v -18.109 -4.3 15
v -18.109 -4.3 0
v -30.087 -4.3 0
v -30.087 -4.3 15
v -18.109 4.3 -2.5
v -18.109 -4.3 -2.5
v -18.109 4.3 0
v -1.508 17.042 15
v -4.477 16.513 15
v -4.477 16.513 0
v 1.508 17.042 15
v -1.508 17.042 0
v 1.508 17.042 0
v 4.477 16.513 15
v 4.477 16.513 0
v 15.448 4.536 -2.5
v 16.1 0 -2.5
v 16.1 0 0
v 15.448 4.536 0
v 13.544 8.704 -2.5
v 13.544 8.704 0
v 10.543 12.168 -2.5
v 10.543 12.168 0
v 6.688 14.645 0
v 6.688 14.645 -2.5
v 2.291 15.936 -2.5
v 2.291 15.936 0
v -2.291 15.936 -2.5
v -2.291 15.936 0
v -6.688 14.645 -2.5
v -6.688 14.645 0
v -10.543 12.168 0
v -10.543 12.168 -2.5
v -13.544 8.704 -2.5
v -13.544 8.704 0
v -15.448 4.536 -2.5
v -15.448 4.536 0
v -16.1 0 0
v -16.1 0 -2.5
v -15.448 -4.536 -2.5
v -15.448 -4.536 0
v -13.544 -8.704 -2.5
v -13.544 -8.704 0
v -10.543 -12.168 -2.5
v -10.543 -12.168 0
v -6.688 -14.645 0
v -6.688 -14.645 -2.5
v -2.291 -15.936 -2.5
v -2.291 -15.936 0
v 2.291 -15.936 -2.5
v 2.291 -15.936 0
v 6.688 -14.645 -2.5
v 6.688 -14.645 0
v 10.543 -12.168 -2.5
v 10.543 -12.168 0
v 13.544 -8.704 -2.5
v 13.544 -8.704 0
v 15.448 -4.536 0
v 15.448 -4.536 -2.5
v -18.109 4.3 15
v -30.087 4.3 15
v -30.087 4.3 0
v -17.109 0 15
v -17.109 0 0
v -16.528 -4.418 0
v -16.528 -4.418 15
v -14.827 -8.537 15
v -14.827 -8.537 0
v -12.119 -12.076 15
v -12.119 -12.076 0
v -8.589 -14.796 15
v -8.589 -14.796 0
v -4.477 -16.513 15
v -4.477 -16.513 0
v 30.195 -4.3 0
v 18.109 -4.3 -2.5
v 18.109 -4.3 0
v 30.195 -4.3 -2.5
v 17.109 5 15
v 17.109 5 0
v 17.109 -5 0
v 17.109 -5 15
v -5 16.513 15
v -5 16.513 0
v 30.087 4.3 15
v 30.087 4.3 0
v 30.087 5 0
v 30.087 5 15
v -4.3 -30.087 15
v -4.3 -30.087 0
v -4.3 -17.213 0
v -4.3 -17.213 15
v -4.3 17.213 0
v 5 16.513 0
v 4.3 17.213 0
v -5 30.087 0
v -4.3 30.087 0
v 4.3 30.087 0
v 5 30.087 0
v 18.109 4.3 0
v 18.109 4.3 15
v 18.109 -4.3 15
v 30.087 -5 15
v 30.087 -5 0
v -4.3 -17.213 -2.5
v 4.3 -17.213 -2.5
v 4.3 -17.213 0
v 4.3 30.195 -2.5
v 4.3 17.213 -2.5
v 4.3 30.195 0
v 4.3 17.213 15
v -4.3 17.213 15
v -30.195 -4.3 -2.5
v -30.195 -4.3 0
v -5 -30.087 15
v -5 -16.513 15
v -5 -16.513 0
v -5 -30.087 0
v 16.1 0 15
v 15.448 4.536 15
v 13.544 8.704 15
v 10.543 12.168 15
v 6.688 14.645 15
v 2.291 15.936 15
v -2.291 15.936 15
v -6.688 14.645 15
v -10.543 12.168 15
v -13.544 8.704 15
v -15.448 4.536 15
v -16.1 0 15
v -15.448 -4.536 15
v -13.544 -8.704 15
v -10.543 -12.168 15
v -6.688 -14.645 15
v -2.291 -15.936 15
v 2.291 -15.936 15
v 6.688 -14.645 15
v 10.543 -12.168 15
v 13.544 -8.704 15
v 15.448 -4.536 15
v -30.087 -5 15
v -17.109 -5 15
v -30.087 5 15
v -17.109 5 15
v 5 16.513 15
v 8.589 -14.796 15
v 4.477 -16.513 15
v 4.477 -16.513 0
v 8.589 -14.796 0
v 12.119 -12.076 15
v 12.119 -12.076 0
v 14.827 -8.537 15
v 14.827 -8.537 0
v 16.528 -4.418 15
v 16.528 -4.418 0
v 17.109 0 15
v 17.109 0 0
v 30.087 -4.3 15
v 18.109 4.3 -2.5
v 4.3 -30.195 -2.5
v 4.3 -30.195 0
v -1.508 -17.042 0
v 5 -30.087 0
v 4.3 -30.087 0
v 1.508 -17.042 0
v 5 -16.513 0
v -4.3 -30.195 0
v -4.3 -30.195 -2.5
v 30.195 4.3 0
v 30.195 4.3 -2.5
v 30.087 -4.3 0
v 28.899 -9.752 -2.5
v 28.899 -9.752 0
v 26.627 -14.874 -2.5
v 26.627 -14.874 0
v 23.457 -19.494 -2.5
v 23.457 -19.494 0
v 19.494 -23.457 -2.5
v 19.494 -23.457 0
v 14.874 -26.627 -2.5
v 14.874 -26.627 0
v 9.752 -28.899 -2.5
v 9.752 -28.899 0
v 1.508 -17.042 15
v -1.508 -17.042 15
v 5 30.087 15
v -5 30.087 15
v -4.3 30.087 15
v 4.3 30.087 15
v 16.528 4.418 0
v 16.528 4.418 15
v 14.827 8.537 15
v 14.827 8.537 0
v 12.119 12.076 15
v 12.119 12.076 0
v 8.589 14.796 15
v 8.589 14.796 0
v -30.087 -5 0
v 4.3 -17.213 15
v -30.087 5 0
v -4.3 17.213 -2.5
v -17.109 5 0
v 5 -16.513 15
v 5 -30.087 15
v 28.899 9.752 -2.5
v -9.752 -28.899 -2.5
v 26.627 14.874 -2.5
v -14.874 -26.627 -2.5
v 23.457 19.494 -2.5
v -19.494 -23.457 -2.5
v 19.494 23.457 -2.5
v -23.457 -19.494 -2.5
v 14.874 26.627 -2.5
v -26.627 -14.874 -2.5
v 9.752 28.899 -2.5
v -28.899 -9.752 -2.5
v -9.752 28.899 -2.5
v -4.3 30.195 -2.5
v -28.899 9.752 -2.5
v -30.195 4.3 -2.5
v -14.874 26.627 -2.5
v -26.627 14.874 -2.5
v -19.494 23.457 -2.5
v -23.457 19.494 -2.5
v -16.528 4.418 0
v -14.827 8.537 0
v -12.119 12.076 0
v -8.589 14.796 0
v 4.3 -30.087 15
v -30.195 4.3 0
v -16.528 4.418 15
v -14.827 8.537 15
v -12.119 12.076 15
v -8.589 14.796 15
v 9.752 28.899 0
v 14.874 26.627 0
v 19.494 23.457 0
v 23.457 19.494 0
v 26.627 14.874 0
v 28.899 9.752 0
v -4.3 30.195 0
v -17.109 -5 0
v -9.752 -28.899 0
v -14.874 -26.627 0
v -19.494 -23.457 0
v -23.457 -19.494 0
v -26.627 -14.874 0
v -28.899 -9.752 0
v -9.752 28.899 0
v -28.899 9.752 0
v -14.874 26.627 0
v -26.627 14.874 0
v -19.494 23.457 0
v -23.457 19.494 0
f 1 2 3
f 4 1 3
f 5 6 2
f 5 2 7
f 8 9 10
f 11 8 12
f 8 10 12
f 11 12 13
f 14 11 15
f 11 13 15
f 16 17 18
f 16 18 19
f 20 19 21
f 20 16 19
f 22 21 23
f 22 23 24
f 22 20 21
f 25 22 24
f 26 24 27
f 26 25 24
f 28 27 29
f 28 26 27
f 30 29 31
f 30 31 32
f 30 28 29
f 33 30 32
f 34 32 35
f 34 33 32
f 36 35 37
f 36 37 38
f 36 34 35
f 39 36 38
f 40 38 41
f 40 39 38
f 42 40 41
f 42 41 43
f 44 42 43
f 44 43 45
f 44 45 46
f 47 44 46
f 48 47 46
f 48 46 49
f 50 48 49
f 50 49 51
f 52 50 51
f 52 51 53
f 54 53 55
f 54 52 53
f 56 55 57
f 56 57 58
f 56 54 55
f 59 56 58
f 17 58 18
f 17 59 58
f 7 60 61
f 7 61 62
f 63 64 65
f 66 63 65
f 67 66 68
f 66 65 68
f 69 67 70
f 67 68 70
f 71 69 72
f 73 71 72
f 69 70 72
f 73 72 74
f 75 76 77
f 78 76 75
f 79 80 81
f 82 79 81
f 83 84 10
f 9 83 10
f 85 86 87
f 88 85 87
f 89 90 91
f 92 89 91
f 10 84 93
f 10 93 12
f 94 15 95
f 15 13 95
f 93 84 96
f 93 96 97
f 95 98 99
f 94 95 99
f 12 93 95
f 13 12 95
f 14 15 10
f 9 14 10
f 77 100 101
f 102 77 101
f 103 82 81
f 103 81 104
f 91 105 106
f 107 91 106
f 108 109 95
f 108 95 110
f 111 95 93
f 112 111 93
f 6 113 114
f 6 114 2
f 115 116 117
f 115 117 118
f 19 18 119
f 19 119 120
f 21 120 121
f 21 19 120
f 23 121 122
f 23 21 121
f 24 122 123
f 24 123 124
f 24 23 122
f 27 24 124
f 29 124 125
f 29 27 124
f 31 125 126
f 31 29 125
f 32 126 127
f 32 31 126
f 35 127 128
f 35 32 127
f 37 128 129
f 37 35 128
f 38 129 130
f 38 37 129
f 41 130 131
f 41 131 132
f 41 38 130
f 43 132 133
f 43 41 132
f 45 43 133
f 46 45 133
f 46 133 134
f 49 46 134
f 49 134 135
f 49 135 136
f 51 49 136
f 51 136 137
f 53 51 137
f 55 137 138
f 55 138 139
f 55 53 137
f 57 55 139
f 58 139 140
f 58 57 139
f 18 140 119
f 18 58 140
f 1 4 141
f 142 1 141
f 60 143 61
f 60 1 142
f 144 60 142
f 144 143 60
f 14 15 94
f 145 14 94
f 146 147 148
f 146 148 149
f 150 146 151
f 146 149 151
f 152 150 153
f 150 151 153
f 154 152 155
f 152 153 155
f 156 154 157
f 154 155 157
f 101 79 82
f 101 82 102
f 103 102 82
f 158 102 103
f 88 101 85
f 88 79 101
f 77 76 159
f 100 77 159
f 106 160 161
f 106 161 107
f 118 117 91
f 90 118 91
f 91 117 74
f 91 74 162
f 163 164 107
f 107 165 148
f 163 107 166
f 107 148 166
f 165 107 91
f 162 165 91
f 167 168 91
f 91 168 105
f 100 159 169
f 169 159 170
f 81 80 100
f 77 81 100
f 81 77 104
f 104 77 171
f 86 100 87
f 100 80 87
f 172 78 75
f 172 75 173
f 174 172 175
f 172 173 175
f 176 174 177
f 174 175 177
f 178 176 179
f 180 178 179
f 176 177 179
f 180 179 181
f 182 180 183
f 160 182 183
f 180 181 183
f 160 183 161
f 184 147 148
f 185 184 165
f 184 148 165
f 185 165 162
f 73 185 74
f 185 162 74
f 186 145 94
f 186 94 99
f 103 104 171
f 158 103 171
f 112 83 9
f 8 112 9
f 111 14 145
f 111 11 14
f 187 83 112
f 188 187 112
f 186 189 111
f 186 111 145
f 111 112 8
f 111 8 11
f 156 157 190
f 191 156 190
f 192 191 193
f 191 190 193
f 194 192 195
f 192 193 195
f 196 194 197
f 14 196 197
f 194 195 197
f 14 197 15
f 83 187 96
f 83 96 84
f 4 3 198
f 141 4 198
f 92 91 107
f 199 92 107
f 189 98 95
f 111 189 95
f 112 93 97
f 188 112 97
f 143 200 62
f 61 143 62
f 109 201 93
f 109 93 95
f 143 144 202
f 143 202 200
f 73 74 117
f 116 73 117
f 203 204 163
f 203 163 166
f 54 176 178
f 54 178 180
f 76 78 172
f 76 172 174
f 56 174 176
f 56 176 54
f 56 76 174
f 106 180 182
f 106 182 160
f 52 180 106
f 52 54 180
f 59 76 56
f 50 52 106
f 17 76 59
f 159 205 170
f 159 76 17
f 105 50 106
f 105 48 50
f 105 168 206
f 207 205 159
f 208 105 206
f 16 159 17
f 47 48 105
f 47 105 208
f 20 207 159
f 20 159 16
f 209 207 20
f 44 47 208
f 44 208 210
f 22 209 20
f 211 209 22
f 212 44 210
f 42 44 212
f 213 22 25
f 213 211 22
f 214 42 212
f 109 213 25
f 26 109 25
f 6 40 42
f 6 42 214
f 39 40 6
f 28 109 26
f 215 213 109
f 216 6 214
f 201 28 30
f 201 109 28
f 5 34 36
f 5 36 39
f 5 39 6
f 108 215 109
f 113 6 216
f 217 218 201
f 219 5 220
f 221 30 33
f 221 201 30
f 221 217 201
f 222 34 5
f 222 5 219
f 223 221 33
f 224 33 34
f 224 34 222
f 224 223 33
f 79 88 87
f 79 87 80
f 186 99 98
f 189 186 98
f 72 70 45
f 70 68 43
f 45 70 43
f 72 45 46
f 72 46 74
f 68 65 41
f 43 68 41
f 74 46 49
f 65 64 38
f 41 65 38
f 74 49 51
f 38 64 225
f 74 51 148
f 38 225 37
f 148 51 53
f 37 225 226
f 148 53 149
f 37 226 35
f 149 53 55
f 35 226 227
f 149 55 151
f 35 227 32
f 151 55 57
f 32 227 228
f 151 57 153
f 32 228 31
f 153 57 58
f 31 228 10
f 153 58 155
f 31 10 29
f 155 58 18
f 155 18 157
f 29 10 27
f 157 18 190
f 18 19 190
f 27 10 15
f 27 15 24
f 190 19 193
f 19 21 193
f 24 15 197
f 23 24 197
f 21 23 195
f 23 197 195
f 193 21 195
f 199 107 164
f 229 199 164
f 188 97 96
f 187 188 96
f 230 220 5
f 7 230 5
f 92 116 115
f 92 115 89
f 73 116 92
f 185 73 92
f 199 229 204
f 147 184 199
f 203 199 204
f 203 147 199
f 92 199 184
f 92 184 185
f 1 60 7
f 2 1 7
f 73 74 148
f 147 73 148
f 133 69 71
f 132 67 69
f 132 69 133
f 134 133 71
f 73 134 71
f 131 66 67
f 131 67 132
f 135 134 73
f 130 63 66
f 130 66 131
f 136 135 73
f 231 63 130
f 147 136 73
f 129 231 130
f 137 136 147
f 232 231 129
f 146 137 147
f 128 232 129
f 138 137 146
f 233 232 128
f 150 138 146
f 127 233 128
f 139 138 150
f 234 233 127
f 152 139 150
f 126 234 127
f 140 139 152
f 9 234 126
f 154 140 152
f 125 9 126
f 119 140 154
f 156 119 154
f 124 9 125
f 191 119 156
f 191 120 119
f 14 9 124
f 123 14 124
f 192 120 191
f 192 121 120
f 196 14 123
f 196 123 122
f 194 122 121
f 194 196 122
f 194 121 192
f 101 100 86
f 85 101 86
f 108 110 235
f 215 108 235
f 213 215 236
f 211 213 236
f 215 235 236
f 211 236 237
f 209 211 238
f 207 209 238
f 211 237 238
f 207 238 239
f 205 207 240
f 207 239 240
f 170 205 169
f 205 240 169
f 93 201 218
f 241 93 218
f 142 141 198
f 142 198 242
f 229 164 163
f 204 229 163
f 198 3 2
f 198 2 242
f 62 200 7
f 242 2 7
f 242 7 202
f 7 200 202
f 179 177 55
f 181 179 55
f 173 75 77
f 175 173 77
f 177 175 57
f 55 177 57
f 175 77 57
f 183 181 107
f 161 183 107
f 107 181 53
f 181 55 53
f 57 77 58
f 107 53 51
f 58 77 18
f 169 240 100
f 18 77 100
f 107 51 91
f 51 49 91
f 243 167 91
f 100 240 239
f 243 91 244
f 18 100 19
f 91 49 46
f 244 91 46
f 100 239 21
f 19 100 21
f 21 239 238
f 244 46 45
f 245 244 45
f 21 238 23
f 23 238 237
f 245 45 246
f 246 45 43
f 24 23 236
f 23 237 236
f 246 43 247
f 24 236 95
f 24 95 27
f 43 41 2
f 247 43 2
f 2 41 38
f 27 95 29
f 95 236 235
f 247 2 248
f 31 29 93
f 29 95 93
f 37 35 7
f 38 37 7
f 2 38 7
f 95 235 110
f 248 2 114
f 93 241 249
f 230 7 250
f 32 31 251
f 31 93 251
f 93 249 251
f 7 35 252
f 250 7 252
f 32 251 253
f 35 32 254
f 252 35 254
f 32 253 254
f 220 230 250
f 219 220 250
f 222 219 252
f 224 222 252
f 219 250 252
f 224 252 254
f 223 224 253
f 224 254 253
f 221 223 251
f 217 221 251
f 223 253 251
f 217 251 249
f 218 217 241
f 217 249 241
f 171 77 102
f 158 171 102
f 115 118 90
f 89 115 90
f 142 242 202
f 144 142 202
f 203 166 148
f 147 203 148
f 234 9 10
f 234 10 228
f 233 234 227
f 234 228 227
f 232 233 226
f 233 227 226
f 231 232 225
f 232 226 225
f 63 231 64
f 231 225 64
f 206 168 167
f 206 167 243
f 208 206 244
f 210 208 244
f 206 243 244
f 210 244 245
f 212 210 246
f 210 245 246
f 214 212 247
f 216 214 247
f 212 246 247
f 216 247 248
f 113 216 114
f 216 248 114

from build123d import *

# Parameters (mm, degrees)
SKETCH1_R             = 16.1
BOSS_EXTRUDE1_DEPTH   = 15
BOSS_EXTRUDE1_2_DEPTH = 15
BOSS_EXTRUDE1_3_DEPTH = 15
BOSS_EXTRUDE1_4_DEPTH = 15
BOSS_EXTRUDE1_5_DEPTH = 15
SKETCH2_R             = 30.5
BOSS_EXTRUDE8_DEPTH   = 2.5
CUT_EXTRUDE1_START    = -1
SKETCH3_W             = 15
SKETCH3_H             = 8.6
CUT_EXTRUDE1_DEPTH    = 1.853819388
CUT_EXTRUDE2_START    = -1
SKETCH4_W             = 17.5
SKETCH4_H             = 8.6
CUT_EXTRUDE2_DEPTH    = 1.853819388
CUT_EXTRUDE3_START    = -2.5
SKETCH5_R             = 16.1
SKETCH5_W             = 18.491872575
SKETCH5_H             = 8.6
SKETCH5_W_2           = 8.6
SKETCH5_H_2           = 42.348370594
SKETCH5_W_3           = 37.801288888
SKETCH5_H_3           = 29.036785998
CUT_EXTRUDE3_DEPTH    = 2.5


with BuildPart() as part:
    # Sketch1 → Boss-Extrude1 (new body)
    with BuildSketch(Plane.XY):
        with BuildLine():
            ThreePointArc((4.476636951, -16.512627233), (13.588533998, -10.39513734), (17.108685997, 0))
            ThreePointArc((17.108685997, 0), (13.588533998, 10.39513734), (4.476636951, 16.512627233))
            Line((4.476636951, 16.512627233), (-4.476636951, 16.512627233))
            ThreePointArc((-4.476636951, 16.512627233), (-13.588533998, 10.39513734), (-17.108685997, 0))
            ThreePointArc((-17.108685997, 0), (-13.588533998, -10.39513734), (-4.476636951, -16.512627233))
            Line((-4.476636951, -16.512627233), (4.476636951, -16.512627233))
        make_face()
        Circle(SKETCH1_R, mode=Mode.SUBTRACT)
    extrude(amount=BOSS_EXTRUDE1_DEPTH)


with BuildPart() as body_2:
    # Sketch1 → Boss-Extrude1 2 (new body)
    with BuildSketch(Plane.XY):
        Polygon((17.108685997, 5), (17.108685997, 0), (17.108685997, -5), (30.087372767, -5), (30.087372767, -4.3), (19.962505385, -4.3), (19.962505385, 4.3), (30.087372767, 4.3), (30.087372767, 5), align=None)
    extrude(amount=BOSS_EXTRUDE1_2_DEPTH)

    # Sketch3 → Cut-Extrude1 (cut)
    with BuildSketch(Plane.ZY.offset(-17.108685997).offset(CUT_EXTRUDE1_START)):
        with Locations((7.5, 0)):
            Rectangle(SKETCH3_W, SKETCH3_H)
    extrude(amount=-CUT_EXTRUDE1_DEPTH, mode=Mode.SUBTRACT)


with BuildPart() as body_3:
    # Sketch1 → Boss-Extrude1 3 (new body)
    with BuildSketch(Plane.XY):
        Polygon((-17.108685997, -5), (-17.108685997, 0), (-17.108685997, 5), (-30.087372767, 5), (-30.087372767, 4.3), (-19.962505385, 4.3), (-19.962505385, -4.3), (-30.087372767, -4.3), (-30.087372767, -5), align=None)
    extrude(amount=BOSS_EXTRUDE1_3_DEPTH)

    # Sketch4 → Cut-Extrude2 (cut)
    with BuildSketch(Plane(origin=(-17.108685997, 0, 0), x_dir=(0, 0, -1), z_dir=(1, 0, 0)).offset(CUT_EXTRUDE2_START)):
        with Locations((-6.25, 0)):
            Rectangle(SKETCH4_W, SKETCH4_H)
    extrude(amount=-CUT_EXTRUDE2_DEPTH, mode=Mode.SUBTRACT)


with BuildPart() as body_4:
    # Sketch1 → Boss-Extrude1 4 (new body)
    with BuildSketch(Plane.XY):
        with BuildLine():
            Line((4.476636951, 16.512627233), (5, 16.512627233))
            Line((5, 16.512627233), (5, 30.087372767))
            Line((5, 30.087372767), (4.3, 30.087372767))
            Line((4.3, 30.087372767), (4.3, 17.212627233))
            Line((4.3, 17.212627233), (-4.3, 17.212627233))
            Line((-4.3, 17.212627233), (-4.3, 30.087372767))
            Line((-4.3, 30.087372767), (-5, 30.087372767))
            Line((-5, 30.087372767), (-5, 16.512627233))
            Line((-5, 16.512627233), (-4.476636951, 16.512627233))
            ThreePointArc((-4.476636951, 16.512627233), (0, 17.108685997), (4.476636951, 16.512627233))
        make_face()
    extrude(amount=BOSS_EXTRUDE1_4_DEPTH)


with BuildPart() as body_5:
    # Sketch1 → Boss-Extrude1 5 (new body)
    with BuildSketch(Plane.XY):
        with BuildLine():
            Line((5, -16.512627233), (4.476636951, -16.512627233))
            ThreePointArc((4.476636951, -16.512627233), (0, -17.108685997), (-4.476636951, -16.512627233))
            Line((-4.476636951, -16.512627233), (-5, -16.512627233))
            Line((-5, -16.512627233), (-5, -30.087372767))
            Line((-5, -30.087372767), (-4.3, -30.087372767))
            Line((-4.3, -30.087372767), (-4.3, -17.212627233))
            Line((-4.3, -17.212627233), (4.3, -17.212627233))
            Line((4.3, -17.212627233), (4.3, -30.087372767))
            Line((4.3, -30.087372767), (5, -30.087372767))
            Line((5, -30.087372767), (5, -16.512627233))
        make_face()
    extrude(amount=BOSS_EXTRUDE1_5_DEPTH)


with BuildPart() as body_6:
    # Sketch2 → Boss-Extrude8 (new body)
    with BuildSketch(Plane(origin=(0, 0, 0), x_dir=(-1, 0, 0), z_dir=(0, 0, -1))):
        Circle(SKETCH2_R)
    extrude(amount=BOSS_EXTRUDE8_DEPTH)

    # Sketch5 → Cut-Extrude3 (cut)
    with BuildSketch(Plane.XY.offset(CUT_EXTRUDE3_START)):
        Circle(SKETCH5_R)
        with Locations((-27.354622285, 0)):
            Rectangle(SKETCH5_W, SKETCH5_H)
        with Locations((0, 38.38681253)):
            Rectangle(SKETCH5_W_2, SKETCH5_H_2)
        with Locations((37.009330441, 0)):
            Rectangle(SKETCH5_W_3, SKETCH5_H)
        with Locations((0, -31.731020232)):
            Rectangle(SKETCH5_W_2, SKETCH5_H_3)
    extrude(amount=CUT_EXTRUDE3_DEPTH, mode=Mode.SUBTRACT)


solid = Compound([part.part, body_2.part, body_3.part, body_4.part, body_5.part, body_6.part])
